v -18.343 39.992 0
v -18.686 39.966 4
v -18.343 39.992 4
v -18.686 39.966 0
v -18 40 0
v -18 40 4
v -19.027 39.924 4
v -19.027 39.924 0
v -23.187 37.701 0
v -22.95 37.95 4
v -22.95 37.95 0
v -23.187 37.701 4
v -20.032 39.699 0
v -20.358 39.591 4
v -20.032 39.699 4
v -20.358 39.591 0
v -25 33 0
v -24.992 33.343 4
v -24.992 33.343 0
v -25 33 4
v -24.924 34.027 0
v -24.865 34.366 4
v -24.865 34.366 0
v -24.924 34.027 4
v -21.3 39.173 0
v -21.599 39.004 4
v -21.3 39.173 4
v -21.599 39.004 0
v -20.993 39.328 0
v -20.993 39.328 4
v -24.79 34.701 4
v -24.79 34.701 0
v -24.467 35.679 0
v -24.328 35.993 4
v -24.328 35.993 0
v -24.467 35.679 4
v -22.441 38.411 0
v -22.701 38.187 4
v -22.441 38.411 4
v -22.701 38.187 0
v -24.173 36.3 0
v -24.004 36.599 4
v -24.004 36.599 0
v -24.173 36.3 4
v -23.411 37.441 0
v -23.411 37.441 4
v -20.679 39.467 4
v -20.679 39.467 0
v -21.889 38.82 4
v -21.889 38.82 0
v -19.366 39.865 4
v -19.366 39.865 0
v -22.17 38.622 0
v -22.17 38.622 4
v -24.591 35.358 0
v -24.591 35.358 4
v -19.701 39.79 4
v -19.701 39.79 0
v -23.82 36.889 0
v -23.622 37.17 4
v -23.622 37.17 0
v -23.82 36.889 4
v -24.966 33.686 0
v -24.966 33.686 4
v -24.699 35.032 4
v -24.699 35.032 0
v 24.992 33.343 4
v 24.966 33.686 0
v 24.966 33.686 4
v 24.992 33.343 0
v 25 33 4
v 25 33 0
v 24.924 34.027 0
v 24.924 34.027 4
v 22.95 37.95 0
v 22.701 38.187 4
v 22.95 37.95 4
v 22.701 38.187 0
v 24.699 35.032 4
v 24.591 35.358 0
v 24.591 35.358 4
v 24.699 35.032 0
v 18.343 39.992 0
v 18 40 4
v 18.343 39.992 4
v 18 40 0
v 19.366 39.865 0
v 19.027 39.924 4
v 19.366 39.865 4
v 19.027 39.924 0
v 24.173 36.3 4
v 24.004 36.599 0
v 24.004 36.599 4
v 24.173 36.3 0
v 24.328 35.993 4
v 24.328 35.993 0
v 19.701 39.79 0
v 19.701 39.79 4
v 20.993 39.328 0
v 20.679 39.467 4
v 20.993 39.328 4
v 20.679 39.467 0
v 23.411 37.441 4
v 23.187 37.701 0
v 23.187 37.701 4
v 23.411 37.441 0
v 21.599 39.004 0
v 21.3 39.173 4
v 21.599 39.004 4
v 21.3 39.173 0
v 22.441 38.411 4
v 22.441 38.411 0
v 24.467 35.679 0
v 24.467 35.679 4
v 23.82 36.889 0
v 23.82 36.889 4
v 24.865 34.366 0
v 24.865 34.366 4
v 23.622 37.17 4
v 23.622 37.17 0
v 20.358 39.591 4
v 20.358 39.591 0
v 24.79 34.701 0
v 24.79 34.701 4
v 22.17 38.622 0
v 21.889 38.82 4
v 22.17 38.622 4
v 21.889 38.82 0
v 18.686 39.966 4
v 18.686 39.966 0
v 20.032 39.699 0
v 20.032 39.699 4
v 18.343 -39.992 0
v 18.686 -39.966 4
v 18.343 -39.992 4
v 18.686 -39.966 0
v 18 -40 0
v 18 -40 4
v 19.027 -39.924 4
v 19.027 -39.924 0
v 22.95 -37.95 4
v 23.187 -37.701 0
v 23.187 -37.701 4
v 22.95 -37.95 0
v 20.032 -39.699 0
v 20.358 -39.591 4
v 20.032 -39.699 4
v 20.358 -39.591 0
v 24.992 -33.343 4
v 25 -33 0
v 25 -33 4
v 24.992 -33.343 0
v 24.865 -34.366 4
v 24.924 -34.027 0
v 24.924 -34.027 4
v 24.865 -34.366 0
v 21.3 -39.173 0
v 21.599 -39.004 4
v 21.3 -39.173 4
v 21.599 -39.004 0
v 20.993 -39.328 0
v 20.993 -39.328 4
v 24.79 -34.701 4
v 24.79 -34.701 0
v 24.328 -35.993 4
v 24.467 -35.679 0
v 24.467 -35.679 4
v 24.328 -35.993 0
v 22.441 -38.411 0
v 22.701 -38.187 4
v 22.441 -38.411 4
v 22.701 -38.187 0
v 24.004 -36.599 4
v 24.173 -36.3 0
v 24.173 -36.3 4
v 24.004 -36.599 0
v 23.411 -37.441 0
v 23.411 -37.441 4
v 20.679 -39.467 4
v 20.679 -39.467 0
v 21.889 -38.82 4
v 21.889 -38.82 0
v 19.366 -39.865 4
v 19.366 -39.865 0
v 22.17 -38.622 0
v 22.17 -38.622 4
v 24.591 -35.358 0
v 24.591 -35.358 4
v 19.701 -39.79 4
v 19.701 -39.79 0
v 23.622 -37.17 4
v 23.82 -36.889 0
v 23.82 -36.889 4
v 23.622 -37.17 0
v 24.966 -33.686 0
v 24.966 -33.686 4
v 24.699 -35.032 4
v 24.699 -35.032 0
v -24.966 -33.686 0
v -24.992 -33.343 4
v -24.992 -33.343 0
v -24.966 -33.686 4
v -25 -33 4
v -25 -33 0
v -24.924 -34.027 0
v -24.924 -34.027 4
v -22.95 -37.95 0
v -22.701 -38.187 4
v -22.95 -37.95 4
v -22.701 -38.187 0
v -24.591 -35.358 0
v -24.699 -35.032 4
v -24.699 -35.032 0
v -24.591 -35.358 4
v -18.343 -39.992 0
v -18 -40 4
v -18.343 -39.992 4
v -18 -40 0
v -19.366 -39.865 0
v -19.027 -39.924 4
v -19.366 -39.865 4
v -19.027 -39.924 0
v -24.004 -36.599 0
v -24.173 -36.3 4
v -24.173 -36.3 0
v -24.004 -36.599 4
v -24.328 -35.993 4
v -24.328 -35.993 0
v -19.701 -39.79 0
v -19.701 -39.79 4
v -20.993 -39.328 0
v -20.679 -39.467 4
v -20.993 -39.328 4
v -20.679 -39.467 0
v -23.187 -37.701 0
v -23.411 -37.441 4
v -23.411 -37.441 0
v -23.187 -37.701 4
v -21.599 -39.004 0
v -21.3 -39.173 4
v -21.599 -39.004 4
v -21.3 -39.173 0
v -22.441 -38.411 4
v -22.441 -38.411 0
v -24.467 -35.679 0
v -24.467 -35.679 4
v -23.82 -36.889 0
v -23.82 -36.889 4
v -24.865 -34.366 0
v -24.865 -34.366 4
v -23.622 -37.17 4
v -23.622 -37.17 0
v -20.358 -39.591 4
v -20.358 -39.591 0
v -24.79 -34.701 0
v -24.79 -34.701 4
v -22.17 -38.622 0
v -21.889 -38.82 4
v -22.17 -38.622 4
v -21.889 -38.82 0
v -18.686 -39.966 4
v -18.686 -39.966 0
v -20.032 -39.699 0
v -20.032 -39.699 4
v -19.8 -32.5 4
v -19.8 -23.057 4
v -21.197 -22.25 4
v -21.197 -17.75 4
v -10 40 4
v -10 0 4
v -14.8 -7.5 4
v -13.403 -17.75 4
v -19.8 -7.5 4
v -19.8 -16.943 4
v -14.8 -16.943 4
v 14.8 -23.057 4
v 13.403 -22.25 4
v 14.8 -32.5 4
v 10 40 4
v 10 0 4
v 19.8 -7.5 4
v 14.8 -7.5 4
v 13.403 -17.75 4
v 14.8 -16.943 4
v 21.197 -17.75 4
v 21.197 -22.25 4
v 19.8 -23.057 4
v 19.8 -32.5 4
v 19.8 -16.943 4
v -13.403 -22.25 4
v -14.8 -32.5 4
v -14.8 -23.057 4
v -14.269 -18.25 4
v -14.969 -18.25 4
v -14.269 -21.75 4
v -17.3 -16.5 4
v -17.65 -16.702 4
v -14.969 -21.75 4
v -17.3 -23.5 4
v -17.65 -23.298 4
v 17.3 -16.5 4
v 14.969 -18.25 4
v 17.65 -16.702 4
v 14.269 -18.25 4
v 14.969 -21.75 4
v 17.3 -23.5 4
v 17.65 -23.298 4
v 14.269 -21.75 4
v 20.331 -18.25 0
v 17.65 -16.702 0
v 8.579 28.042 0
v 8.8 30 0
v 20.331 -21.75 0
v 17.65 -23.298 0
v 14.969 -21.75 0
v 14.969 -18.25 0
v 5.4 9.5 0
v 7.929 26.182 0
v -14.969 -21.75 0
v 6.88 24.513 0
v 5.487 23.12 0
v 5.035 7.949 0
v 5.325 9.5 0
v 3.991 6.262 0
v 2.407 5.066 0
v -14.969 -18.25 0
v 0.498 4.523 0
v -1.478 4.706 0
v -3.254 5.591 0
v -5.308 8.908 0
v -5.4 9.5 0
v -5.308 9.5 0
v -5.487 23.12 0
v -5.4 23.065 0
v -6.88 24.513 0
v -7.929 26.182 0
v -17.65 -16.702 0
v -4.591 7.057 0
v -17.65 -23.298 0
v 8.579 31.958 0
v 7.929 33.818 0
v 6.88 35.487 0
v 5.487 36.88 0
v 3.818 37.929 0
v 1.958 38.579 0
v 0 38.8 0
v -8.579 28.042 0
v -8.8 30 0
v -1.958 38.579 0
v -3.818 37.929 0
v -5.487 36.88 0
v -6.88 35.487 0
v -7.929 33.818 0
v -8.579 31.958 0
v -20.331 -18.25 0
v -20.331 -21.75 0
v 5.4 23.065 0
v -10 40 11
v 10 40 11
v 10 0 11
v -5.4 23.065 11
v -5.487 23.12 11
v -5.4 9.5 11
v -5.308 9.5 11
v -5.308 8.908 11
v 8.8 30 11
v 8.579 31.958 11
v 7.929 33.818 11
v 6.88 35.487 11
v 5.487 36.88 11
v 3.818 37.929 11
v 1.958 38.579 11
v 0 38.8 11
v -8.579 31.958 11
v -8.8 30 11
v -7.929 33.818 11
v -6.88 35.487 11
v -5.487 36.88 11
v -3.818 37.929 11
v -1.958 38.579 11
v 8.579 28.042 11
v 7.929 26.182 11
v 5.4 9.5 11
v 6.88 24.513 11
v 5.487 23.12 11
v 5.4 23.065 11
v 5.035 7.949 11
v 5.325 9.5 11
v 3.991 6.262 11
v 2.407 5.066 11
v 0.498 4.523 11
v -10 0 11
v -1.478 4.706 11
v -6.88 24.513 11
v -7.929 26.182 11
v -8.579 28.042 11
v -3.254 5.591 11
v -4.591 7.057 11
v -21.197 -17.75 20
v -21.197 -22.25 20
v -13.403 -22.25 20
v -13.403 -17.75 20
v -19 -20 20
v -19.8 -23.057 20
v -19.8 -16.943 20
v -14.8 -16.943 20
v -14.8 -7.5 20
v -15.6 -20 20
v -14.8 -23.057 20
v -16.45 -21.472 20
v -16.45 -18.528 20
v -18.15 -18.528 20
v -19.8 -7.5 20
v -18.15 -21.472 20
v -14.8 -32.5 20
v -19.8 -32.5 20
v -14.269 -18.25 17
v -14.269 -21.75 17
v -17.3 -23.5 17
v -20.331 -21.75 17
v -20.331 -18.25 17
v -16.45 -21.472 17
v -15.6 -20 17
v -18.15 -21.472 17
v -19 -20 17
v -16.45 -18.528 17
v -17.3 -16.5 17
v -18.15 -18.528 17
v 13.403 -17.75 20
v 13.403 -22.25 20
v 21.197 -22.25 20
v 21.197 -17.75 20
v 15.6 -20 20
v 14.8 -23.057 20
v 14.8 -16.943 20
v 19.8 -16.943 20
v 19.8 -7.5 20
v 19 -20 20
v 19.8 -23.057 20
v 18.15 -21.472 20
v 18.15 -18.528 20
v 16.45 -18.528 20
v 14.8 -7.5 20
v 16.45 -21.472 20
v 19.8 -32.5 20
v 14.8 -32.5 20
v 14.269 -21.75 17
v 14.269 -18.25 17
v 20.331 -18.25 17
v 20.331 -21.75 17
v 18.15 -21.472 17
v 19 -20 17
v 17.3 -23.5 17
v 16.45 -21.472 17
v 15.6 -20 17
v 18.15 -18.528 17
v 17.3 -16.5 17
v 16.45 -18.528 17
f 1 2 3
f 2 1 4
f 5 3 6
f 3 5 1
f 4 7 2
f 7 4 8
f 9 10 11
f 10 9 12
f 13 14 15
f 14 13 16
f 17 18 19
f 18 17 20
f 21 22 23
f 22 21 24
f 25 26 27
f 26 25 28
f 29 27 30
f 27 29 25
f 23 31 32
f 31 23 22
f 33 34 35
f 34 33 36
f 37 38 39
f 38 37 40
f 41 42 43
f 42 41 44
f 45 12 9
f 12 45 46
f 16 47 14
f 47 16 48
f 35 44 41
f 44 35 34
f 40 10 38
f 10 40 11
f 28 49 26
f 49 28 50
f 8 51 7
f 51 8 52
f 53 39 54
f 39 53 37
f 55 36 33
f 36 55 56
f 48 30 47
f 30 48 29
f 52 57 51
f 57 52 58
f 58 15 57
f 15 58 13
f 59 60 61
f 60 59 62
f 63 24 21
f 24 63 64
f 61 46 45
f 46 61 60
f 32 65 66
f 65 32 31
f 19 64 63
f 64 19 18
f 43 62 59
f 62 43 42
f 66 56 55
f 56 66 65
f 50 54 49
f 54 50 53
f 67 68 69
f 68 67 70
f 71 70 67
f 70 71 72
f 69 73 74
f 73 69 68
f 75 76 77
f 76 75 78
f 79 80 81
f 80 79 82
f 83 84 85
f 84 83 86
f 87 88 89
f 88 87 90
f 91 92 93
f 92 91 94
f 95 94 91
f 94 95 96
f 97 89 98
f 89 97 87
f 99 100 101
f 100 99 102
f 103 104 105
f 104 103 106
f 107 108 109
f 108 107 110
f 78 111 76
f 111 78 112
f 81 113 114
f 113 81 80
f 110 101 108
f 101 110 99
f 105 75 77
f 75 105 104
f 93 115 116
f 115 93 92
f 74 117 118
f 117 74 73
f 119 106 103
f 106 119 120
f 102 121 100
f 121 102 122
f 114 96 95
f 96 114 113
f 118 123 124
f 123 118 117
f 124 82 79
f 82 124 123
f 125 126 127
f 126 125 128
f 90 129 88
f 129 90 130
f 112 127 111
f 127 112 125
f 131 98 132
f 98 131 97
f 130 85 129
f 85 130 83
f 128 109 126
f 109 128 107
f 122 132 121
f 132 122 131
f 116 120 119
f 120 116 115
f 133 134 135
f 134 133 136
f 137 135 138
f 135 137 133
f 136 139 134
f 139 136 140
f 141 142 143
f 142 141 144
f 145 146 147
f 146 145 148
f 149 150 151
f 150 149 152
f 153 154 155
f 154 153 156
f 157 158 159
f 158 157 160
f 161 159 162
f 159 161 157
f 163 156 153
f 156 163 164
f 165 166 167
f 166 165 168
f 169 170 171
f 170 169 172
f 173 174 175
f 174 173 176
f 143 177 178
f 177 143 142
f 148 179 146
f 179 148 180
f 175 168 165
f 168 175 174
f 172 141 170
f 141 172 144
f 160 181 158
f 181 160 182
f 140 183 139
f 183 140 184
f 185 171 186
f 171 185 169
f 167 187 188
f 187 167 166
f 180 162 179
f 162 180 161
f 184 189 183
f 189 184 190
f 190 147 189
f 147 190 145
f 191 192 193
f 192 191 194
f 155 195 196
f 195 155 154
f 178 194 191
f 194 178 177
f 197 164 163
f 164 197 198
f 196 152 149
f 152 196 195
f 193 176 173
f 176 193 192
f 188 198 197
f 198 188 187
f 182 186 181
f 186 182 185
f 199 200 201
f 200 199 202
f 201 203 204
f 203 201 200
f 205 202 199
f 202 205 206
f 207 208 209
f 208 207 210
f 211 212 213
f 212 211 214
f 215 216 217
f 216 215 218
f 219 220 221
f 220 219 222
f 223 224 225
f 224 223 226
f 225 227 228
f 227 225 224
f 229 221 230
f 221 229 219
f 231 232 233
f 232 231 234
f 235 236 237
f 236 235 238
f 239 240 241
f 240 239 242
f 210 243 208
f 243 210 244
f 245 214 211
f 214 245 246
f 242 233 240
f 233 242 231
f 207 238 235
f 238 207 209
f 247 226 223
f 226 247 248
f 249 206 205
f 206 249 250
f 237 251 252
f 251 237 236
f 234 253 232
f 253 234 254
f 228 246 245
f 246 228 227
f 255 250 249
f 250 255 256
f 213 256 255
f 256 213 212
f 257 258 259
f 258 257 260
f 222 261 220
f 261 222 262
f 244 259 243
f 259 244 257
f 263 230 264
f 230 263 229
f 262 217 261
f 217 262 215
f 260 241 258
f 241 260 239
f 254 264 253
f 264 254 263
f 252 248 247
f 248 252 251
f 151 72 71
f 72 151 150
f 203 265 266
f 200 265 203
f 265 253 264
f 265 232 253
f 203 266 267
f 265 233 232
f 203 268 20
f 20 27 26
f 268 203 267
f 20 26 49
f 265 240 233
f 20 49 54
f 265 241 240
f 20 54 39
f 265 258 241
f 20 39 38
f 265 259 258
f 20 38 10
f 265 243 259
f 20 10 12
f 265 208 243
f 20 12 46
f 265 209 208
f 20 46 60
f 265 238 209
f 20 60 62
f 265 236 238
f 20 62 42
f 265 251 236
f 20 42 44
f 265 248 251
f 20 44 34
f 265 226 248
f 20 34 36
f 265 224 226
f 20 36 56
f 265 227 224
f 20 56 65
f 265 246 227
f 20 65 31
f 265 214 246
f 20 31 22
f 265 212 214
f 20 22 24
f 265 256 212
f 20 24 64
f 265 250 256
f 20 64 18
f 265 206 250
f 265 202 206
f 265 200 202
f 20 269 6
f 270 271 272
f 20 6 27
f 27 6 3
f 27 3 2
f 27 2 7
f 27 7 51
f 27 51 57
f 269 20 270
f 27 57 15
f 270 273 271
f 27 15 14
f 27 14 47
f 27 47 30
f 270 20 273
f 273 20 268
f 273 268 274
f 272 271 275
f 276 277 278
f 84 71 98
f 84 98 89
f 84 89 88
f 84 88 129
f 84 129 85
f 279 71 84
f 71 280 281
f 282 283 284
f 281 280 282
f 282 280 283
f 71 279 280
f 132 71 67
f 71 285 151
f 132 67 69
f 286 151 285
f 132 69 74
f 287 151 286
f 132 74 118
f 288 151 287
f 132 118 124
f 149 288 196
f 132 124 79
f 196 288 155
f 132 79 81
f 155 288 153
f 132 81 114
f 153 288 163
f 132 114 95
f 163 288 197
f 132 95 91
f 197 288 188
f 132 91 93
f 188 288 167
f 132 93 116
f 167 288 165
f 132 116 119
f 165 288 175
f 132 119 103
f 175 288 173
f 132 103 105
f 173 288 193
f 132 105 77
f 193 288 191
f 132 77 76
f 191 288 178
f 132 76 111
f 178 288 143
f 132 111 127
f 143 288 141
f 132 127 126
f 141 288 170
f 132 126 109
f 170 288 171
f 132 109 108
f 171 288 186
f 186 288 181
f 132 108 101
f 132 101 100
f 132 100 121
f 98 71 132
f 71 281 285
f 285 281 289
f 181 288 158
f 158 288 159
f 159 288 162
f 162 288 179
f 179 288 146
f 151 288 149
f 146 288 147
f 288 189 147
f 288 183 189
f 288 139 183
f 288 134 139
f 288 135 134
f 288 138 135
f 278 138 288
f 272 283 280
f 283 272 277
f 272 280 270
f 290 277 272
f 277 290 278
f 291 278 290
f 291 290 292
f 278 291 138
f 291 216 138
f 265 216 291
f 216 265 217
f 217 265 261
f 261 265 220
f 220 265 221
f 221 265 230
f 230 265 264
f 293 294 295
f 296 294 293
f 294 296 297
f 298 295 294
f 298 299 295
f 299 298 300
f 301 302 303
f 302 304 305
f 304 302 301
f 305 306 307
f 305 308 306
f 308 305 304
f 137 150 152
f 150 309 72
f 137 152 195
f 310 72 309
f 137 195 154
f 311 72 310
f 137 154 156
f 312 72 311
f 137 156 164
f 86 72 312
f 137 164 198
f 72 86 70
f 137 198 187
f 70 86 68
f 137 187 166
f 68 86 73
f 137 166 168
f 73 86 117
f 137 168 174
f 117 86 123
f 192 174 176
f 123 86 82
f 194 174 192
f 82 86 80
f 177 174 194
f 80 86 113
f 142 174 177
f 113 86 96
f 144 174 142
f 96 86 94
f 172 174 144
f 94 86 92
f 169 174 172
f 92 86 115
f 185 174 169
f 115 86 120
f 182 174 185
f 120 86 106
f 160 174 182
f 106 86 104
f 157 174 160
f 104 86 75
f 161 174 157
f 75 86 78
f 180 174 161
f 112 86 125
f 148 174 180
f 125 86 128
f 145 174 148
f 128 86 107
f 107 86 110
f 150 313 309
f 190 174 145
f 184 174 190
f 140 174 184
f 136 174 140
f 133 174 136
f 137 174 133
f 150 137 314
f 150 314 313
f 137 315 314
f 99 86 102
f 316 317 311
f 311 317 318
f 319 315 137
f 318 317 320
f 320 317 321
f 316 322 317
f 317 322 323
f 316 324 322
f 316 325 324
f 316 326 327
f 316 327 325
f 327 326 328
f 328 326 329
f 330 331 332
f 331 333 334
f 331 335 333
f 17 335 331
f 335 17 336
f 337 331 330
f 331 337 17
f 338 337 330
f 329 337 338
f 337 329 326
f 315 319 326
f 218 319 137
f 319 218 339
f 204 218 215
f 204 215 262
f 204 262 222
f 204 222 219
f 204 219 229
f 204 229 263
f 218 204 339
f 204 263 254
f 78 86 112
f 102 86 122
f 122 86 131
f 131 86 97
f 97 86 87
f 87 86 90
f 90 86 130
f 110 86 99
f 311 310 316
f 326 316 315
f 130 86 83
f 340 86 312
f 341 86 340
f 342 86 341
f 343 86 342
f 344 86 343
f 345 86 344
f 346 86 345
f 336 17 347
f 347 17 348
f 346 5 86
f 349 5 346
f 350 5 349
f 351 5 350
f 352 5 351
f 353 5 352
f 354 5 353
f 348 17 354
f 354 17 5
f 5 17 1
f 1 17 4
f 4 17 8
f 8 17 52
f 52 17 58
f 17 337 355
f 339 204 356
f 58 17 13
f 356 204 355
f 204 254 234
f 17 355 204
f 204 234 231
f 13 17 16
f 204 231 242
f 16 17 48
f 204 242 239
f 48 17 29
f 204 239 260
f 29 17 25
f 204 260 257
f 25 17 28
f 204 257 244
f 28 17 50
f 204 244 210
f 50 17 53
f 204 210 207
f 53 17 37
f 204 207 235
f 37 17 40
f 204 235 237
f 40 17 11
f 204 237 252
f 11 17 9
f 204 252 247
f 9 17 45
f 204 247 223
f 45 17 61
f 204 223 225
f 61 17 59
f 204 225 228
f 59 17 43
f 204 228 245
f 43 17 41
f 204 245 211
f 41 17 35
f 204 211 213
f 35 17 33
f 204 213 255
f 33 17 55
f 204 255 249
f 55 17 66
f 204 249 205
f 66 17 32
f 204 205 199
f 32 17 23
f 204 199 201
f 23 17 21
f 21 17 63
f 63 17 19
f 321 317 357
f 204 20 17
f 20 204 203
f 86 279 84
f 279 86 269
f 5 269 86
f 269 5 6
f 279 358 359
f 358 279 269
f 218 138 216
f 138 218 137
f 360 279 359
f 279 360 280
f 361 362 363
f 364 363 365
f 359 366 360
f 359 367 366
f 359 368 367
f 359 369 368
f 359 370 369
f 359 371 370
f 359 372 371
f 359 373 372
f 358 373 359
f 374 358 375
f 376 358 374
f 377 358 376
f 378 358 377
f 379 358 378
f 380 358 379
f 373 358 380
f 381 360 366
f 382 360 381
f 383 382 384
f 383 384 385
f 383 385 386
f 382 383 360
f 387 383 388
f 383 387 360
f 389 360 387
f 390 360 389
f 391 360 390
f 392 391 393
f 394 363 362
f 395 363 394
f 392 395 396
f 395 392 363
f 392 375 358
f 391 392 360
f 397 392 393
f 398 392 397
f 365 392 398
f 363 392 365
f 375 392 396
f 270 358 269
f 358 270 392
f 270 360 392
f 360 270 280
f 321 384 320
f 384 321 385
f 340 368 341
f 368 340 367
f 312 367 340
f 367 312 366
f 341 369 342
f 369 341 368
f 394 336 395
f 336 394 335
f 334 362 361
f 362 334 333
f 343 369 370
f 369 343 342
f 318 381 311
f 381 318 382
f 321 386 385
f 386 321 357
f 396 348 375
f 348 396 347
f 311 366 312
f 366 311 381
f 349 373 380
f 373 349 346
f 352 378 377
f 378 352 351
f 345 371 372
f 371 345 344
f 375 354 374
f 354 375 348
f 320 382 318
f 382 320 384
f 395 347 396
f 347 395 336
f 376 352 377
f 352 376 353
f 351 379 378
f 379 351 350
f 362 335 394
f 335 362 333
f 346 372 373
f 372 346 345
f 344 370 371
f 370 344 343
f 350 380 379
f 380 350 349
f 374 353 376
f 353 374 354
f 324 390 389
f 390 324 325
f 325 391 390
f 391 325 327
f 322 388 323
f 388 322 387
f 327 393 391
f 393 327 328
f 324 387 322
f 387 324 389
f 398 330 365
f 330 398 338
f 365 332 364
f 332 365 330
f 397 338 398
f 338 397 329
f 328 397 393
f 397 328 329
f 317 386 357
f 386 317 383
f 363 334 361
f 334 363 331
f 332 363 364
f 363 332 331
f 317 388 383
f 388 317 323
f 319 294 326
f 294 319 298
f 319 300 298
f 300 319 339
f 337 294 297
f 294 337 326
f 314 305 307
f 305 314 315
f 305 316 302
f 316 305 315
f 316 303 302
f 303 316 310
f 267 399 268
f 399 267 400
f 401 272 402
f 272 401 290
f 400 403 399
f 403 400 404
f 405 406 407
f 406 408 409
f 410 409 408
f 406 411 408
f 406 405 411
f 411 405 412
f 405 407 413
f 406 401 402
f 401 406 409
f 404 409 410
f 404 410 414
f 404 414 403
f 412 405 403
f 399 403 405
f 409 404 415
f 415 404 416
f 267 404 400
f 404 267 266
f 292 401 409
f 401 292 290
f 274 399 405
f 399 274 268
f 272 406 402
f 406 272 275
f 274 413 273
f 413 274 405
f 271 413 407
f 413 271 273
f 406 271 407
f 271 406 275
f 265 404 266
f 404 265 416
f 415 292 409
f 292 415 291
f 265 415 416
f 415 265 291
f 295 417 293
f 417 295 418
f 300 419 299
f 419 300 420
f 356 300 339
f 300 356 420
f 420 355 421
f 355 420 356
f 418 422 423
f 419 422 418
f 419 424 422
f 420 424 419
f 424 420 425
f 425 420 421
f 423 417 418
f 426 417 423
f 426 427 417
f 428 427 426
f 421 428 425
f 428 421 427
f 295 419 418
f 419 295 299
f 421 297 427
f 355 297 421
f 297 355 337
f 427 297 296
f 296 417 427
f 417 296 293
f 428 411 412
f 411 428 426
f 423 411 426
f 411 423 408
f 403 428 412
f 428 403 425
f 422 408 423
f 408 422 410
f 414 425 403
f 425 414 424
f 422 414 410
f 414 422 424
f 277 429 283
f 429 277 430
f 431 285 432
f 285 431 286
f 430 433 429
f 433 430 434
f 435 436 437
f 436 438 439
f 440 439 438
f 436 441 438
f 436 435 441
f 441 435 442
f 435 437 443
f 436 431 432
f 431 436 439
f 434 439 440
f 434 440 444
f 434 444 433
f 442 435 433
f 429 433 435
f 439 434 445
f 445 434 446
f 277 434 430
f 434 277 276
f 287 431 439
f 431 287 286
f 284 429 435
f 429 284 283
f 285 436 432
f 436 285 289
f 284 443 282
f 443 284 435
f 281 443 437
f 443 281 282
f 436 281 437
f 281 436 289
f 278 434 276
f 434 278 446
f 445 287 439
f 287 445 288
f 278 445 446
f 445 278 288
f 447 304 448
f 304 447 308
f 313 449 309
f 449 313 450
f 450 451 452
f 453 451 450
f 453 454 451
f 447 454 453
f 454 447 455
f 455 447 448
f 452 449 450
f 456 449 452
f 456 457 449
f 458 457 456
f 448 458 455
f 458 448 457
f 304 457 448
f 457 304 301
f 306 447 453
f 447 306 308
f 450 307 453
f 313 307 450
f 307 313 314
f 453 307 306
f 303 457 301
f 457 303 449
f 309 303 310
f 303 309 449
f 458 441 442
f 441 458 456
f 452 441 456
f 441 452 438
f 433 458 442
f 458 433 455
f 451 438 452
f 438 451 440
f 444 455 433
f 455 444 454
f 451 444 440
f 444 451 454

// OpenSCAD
/*platte profielzylinder*/


b=50;  //Breite bodenplatte
h=80; //Länge bodenplatte
d=4;   //Dicke bodenplatte
a=18; // abstand motor mount 
pmm=-29;  // position motor mount 
za=40; //Zapfen zur mitte


difference(){
     /*bodenplatte*/
    union(){ 
    translate([-b/2,-h/2,0])
    roundedCube([b,h,d]); 
    //cube([b,h,d],true);
    translate([0,h/2-20,6])
    cube([20,40,10],true);
/*   zapfencl(b/2,35);
    zapfencl(b/2,-45);  
    zapfencr(-b/2,35);
    zapfencr(-b/2,-45); 
*/
        

    }
    /* ausschnitt für schloss */
translate([0,h/2-10,-3]) 
   cylinder(23,8.8,8.8,false);
translate([0,h/2-30.1,-3])
    cylinder(20,5.4,5.4,false);
translate([0,h/2-22.5,7])
    cube([10.8,16,20],true);

motor_mount1(-18,-20);
motor_mount1(18,-20);
 
    /*Zapfen für den deckel*/
 /*   zapfenl(-b/2,za);    
    zapfenl(-b/2,-za);
    zapfenr(b/2-5,za);
    zapfenr(b/2-5,-za);
    mounthole(a,5);  // Loch unter motormount 
    mounthole(-a,5); // Loch unter motormount
*/


 

} 
motor_mount(-17.3,-20);
motor_mount(17.3,-20);
//motormount(a,pmm);  //position relativ zur mitte
//motormount(-a,pmm); //position relativ zur mitte 
/*
Akku  NCR18650B
Durchmesser	18,20 mm ± 0,1 mm
Höhe		65,00 mm ± 0,15 mm
*/
battb=0 ; //länge Batt
battw=0 ; //breite Batt
batth=0 ; //höhe Batt
bpos=-0 ; //pos Batt
bohrh=0 ; //höhe Bohrung
bohrd=0 ; //radius Bohrung

difference(){
translate([-25,bpos]){
        cube([battw,battb,batth],false);

    }
    union(){     
    translate([-9.5,-1,bohrh]){
    rotate([90,0,0]){
    cylinder(71,bohrd,bohrd,10,true);  //Battfach
    }}
translate([9.5,-1,bohrh]){
    rotate([90,0,0]){
    cylinder(71,bohrd,bohrd,10,true);  //Batfacht 
    }}
    }
    }
module zapfenr(x,y)
    {
        linear_extrude(height = 20, center = true, convexity = 0, twist = 0)
        polygon (points=[[x,y],[x,y+20],[x+5,y+15],[x+5,y+5]]);       
    }

module  motor_mount (mmpos1,mmpos2){
   
      difference(){
        translate([mmpos1,mmpos2,0]){
        linear_extrude(height = 20, center = false){
        rotate (30,0,0)
        regular_polygon(6,4.5);
        }
        translate([-2.5,2.5])
        linear_extrude(height = 20, center = false){
        square ([5,10]);
        }    
        translate([-2.5,-12.5])
        linear_extrude(height = 20, center = false){
        square ([5,10]);
        }    
        
        }
        union(){
        translate([mmpos1,mmpos2,0]){
        linear_extrude(height = 17, center = false){
        rotate (30,0,0)
        regular_polygon(6,3.5);
        }
        }
        translate([mmpos1,mmpos2,0]){
        linear_extrude(height = 21, center = false){
        circle(1.7);
        }
        }
        }
        }
      
    }
module  motor_mount1 (mmpos1,mmpos2){
   
        translate([mmpos1,mmpos2,-1]){
        linear_extrude(height = 5, center = false){
        rotate (30,0,0)
        regular_polygon(6,3.5);
        }
        }
      
    }
    
 module regular_polygon(order, r=1){
 	angles=[ for (i = [0:order-1]) i*(360/order) ];
 	coords=[ for (th=angles) [r*cos(th), r*sin(th)] ];
 	polygon(coords);
 }
 
 
    
module zapfenl(x,y)
    {
        linear_extrude(height = 20, center = true, convexity = 0, twist = 0)
        //polygon (points=[[x+0,y+5],[x+0,y+15],[x+0,y+20],[x+0,y+0]]); 
         polygon (points=[[x,y+5],[x,y+15],[x+5,y+20],[x+5,y+0]]);
    }
    
module  zapfencl(x,y)
        {
         translate([x-10,y,-d/2]){
         cube([10,30,10],false);
         }
        }

module  zapfencr(x,y)
        {
         translate([x,y,-d/2]){
         cube([10,30,10],false);
         }
        }
        
module  mounthole(x,y)
        {
            b=5;
    linear_extrude(height=20, center = true)
       polygon (points=[[x-b/2,y],[x+b/2,y],[x+b/2,y+20],[x-b/2,y+20] ]); 
    }
  
module  motormount(x,y)
    {
       difference(){
       b=5; //breite halter
       i=2; //mass innen Halter
       a=3;       
       linear_extrude(height=17,center = false)    
       polygon (points=[[x-b,y-2],[x+b,y-2],[x+b,y+22],[x-b,y+22]]);
       linear_extrude(height=20, center = false)
       polygon (points=[[x-i,y+2],[x+i,y+2],[x+i,y+18],[x-i,y+18]]);
       linear_extrude(height=15, center = false)
       polygon(points=[[x-a,y],[x+a,y],[x+a,y+20],[x-a,y+20]]);
       }
    }
   
module roundedCube(dim, r=7, x=false, y=false, z=true, xcorners=[true,true,true,true], ycorners=[true,true,true,true], zcorners=[true,true,true,true], center=false, $fn=128)
{
	translate([(center==true ? (-(dim[0]/2)) : 0), (center==true ? (-(dim[1]/2)) : 0), (center==true ? (-(dim[2]/2)) : 0)])
	{
		difference()
		{
			cube(dim);

			if(z)
			{
				translate([0, 0, -0.1])
				{
					if(zcorners[0])
						translate([0, dim[1]-r]) { rotateAround([0, 0, 90], [r/2, r/2, 0]) { meniscus(h=dim[2], r=r, fn=$fn); } }
					if(zcorners[1])
						translate([dim[0]-r, dim[1]-r]) { meniscus(h=dim[2], r=r, fn=$fn); }
					if(zcorners[2])
						translate([dim[0]-r, 0]) { rotateAround([0, 0, -90], [r/2, r/2, 0]) { meniscus(h=dim[2], r=r, fn=$fn); } }
					if(zcorners[3])
						rotateAround([0, 0, -180], [r/2, r/2, 0]) { meniscus(h=dim[2], r=r, fn=$fn); }
				}
			}

			if(y)
			{
				translate([0, -0.1, 0])
				{
					if(ycorners[0])
						translate([0, 0, dim[2]-r]) { rotateAround([0, 180, 0], [r/2, 0, r/2]) { rotateAround([-90, 0, 0], [0, r/2, r/2]) { meniscus(h=dim[1], r=r); } } }
					if(ycorners[1])
						translate([dim[0]-r, 0, dim[2]-r]) { rotateAround([0, -90, 0], [r/2, 0, r/2]) { rotateAround([-90, 0, 0], [0, r/2, r/2]) { meniscus(h=dim[1], r=r); } } }
					if(ycorners[2])
						translate([dim[0]-r, 0]) { rotateAround([-90, 0, 0], [0, r/2, r/2]) { meniscus(h=dim[1], r=r); } }
					if(ycorners[3])
						rotateAround([0, 90, 0], [r/2, 0, r/2]) { rotateAround([-90, 0, 0], [0, r/2, r/2]) { meniscus(h=dim[1], r=r); } }
				}
			}

			if(x)
			{
				translate([-0.1, 0, 0])
				{
					if(xcorners[0])
						translate([0, dim[1]-r]) { rotateAround([0, 90, 0], [r/2, 0, r/2]) { meniscus(h=dim[0], r=r); } }
					if(xcorners[1])
						translate([0, dim[1]-r, dim[2]-r]) { rotateAround([90, 0, 0], [0, r/2, r/2]) { rotateAround([0, 90, 0], [r/2, 0, r/2]) { meniscus(h=dim[0], r=r); } } }
					if(xcorners[2])
						translate([0, 0, dim[2]-r]) { rotateAround([180, 0, 0], [0, r/2, r/2]) { rotateAround([0, 90, 0], [r/2, 0, r/2]) { meniscus(h=dim[0], r=r); } } }
					if(xcorners[3])
						rotateAround([-90, 0, 0], [0, r/2, r/2]) { rotateAround([0, 90, 0], [r/2, 0, r/2]) { meniscus(h=dim[0], r=r); } }
				}
			}
		}
	}
}

module meniscus(h, r, fn=128)
{
	$fn=fn;

	difference()
	{
		cube([r+0.2, r+0.2, h+0.2]);
		translate([0, 0, -0.1]) { cylinder(h=h+0.4, r=r); }
	}
}

module rotateAround(a, v) { translate(v) { rotate(a) { translate(-v) { children(); } } } }



    
